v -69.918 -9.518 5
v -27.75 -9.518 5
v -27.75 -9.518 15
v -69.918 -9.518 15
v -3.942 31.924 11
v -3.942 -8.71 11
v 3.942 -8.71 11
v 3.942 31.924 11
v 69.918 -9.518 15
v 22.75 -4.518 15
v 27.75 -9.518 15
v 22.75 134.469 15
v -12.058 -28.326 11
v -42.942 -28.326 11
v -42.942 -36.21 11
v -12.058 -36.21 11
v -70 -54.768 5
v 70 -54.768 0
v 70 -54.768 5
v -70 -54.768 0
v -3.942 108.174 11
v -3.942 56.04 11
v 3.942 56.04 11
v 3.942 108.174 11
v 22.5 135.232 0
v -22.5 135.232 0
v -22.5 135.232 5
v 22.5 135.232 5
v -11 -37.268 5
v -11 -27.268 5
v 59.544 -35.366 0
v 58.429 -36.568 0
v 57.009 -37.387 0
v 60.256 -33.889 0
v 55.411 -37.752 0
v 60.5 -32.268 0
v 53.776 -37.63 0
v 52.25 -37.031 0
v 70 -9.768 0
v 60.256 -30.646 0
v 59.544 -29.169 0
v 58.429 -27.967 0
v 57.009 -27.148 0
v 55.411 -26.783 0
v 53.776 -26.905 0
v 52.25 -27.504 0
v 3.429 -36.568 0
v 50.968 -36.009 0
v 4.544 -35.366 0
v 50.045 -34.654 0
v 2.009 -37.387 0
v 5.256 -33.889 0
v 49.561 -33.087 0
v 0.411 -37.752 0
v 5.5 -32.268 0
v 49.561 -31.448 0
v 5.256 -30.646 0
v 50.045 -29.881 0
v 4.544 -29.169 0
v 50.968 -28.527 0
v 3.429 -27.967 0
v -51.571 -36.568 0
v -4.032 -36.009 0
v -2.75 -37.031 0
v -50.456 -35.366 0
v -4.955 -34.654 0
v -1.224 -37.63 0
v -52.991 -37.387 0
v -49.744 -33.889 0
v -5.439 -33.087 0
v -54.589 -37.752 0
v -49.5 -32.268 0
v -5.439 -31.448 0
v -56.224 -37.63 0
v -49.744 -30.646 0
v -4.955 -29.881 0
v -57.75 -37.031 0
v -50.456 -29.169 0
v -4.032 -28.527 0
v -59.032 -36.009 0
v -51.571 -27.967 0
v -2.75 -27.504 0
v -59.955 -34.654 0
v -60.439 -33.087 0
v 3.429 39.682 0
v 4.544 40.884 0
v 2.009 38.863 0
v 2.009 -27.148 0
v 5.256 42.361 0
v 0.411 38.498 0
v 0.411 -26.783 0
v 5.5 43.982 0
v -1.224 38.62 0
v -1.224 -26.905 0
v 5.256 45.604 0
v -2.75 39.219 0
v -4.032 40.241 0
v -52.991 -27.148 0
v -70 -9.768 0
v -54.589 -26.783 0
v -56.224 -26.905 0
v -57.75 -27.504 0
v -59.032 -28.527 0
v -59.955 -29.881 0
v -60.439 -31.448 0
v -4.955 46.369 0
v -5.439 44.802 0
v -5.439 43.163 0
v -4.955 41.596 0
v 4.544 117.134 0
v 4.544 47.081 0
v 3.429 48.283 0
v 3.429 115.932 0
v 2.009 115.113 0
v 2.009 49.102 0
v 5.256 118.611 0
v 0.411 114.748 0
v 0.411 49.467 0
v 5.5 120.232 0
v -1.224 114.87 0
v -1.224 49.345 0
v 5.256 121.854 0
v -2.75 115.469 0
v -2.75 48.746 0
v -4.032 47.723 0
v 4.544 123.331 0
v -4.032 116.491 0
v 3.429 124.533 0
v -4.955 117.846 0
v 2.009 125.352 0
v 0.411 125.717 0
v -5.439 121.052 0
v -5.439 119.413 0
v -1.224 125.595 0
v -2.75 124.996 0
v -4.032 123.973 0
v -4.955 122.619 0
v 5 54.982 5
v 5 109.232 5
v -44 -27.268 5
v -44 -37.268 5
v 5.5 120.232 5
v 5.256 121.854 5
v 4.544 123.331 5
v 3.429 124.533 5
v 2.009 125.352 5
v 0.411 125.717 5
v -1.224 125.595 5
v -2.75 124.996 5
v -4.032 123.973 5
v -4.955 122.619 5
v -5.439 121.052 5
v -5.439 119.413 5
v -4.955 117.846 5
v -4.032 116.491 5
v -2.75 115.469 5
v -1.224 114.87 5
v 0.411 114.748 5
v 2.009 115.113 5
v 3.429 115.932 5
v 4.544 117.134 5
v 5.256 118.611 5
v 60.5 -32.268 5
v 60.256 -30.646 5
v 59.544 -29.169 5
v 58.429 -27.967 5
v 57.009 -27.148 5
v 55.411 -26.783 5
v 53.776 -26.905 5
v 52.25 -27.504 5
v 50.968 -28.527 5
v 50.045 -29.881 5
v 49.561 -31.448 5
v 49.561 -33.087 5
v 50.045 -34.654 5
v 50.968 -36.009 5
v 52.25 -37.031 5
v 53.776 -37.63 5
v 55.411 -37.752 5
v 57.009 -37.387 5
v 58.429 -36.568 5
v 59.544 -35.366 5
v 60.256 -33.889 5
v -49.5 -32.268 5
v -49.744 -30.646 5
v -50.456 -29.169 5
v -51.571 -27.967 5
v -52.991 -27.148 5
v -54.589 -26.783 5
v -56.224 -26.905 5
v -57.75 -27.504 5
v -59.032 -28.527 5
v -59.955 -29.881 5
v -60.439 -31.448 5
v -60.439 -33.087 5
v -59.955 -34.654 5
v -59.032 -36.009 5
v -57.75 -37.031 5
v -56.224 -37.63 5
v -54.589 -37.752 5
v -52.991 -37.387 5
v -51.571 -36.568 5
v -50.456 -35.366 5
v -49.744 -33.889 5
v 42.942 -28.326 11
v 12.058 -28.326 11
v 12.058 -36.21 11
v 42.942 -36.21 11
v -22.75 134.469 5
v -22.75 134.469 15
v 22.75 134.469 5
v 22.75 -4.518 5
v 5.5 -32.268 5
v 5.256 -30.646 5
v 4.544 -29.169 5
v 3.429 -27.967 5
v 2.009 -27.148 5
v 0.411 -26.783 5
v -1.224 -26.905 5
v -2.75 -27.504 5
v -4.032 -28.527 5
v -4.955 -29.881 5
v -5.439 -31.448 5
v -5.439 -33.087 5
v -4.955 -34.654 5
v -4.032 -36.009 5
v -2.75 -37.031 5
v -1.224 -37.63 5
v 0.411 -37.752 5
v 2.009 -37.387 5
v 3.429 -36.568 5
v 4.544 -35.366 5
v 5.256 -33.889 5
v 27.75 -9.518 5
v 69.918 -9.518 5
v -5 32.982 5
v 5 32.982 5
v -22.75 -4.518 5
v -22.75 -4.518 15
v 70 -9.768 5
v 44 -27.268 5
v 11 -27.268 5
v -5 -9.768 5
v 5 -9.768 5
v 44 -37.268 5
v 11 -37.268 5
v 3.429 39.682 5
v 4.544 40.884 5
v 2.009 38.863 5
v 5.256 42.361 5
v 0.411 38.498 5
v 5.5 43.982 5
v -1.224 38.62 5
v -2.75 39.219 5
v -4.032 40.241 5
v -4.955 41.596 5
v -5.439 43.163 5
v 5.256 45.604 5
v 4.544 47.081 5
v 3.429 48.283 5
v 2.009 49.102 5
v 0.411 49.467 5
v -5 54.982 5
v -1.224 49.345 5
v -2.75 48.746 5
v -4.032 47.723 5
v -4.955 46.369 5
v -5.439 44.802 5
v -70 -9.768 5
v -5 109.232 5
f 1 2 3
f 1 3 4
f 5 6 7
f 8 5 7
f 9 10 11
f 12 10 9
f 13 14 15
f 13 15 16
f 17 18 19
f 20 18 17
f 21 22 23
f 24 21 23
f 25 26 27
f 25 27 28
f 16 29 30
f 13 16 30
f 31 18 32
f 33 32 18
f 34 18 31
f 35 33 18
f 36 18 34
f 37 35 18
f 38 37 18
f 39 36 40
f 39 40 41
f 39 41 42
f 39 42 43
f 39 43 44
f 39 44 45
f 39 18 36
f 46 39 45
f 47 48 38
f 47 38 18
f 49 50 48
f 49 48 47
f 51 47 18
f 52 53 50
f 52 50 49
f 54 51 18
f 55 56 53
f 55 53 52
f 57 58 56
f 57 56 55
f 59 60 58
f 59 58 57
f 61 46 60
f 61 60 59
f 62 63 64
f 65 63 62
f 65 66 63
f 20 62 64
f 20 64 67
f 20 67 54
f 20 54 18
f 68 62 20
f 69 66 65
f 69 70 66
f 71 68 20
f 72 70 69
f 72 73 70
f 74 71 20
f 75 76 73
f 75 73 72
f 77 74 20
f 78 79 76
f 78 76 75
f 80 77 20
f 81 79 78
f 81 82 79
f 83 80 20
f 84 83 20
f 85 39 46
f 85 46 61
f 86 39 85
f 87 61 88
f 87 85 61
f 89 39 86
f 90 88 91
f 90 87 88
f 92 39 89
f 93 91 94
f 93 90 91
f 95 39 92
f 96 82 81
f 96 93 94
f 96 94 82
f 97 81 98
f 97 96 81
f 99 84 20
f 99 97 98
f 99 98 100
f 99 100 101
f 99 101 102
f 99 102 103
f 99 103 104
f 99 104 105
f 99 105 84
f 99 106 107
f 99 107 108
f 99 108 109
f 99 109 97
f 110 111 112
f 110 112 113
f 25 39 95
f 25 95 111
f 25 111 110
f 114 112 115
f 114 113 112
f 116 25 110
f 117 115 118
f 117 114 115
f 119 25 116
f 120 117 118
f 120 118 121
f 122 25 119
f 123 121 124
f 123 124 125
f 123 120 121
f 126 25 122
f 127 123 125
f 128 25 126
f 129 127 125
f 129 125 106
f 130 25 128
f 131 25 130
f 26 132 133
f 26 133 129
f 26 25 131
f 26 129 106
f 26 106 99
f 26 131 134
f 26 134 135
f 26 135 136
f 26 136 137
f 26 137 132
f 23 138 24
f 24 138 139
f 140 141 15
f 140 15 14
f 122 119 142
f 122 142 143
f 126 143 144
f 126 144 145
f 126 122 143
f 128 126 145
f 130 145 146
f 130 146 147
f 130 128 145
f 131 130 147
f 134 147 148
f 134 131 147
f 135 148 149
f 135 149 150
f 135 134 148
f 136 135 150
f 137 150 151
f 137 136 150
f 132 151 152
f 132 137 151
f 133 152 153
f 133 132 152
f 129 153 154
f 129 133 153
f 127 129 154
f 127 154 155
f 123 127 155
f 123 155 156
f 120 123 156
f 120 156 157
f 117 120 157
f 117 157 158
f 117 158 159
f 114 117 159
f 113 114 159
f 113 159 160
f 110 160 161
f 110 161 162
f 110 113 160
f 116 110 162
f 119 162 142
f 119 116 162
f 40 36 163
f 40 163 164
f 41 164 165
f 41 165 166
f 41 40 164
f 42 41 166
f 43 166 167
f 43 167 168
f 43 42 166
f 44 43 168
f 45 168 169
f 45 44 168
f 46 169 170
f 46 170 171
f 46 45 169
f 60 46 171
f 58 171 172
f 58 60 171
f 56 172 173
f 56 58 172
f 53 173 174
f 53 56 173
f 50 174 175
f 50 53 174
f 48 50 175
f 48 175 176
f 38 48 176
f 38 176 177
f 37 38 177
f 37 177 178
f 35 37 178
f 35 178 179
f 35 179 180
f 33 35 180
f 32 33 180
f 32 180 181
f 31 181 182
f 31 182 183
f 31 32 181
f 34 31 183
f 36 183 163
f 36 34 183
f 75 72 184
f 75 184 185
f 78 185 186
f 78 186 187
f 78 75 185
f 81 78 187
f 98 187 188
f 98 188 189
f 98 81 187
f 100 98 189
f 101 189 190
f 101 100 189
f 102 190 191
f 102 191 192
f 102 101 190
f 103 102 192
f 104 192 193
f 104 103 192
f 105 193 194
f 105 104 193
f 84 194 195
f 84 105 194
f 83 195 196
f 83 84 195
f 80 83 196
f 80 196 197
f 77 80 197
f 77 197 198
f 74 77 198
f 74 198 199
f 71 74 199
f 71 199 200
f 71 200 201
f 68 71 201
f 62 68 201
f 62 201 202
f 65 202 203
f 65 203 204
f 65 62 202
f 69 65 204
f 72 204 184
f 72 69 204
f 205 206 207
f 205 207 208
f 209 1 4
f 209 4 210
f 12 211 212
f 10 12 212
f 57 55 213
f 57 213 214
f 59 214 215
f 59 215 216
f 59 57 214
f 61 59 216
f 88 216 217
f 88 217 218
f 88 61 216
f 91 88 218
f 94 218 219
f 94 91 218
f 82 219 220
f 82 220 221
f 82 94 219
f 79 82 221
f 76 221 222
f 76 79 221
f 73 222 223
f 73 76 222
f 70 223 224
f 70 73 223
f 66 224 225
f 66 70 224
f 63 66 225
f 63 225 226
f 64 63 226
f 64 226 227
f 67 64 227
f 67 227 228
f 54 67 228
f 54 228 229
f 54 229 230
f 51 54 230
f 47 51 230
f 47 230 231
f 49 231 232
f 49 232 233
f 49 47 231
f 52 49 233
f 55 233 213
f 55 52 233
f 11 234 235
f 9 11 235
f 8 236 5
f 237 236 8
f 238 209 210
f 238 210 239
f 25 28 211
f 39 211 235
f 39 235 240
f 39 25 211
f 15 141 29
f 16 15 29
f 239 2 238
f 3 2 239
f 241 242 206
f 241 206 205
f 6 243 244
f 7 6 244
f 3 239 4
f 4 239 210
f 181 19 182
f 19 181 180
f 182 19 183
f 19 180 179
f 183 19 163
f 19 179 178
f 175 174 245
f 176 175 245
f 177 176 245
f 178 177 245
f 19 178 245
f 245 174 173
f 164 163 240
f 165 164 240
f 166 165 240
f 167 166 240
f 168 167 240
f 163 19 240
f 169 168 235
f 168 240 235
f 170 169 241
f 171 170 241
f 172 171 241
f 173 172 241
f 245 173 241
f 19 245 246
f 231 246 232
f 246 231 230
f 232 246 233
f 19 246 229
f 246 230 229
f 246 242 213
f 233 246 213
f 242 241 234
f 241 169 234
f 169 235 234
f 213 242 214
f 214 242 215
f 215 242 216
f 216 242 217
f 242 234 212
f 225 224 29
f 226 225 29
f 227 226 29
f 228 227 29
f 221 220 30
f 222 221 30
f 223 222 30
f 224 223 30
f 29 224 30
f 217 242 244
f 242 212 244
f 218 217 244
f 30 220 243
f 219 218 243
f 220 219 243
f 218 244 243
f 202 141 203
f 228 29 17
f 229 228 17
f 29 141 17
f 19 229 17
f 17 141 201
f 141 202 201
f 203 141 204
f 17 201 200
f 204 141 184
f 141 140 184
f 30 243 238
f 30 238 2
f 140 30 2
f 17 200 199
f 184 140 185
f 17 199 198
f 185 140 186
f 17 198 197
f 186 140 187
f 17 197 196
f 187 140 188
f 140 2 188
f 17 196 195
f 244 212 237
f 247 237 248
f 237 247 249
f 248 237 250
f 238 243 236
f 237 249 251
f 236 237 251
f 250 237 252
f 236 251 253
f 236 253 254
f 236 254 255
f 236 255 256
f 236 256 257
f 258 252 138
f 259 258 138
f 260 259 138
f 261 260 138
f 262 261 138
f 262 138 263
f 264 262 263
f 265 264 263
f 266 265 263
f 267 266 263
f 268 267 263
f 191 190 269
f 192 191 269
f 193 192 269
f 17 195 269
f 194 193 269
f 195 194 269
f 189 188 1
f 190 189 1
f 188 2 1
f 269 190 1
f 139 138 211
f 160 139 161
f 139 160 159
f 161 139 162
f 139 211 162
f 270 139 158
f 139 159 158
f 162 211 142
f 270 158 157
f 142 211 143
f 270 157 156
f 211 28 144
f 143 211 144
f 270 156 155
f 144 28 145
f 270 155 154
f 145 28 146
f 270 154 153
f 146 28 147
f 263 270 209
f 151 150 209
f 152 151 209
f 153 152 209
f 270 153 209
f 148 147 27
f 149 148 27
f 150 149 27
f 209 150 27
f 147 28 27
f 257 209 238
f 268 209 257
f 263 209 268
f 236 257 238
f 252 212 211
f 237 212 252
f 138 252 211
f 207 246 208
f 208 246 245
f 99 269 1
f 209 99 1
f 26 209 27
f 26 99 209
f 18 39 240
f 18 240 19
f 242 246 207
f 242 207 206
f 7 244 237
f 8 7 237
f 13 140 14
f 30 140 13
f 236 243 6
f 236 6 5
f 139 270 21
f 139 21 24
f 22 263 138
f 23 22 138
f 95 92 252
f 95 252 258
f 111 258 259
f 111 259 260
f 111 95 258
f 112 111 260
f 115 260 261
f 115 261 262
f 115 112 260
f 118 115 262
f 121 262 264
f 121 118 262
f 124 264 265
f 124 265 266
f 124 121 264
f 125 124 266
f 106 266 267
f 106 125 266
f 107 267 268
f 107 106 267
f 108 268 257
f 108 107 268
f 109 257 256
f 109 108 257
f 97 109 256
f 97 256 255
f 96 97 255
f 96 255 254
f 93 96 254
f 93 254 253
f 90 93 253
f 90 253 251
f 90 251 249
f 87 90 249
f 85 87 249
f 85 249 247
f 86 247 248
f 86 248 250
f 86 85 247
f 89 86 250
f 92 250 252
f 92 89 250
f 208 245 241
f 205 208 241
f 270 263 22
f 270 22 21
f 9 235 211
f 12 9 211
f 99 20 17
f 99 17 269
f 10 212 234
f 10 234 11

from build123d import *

# Parameters (mm, degrees)
ESQUISSE1_R        = 5.5
BOSS_EXTRU_1_DEPTH = 5
ESQUISSE3_W        = 10
ESQUISSE3_H        = 54.25
ESQUISSE3_H_2      = 42.75
ESQUISSE3_W_2      = 33
ESQUISSE3_H_3      = 10
BOSS_EXTRU_3_DEPTH = 6
D_POUILLE2_ANGLE   = 10
BOSS_EXTRU_4_DEPTH = 10
CHANFREIN1_SIZE    = 5


with BuildPart() as part:
    # Esquisse1 → Boss.-Extru.1 (new body)
    with BuildSketch(Plane.XY):
        Polygon((-22.5, 135.232443508), (22.5, 135.232443508), (70, -9.767556492), (70, -54.767556492), (-70, -54.767556492), (-70, -9.767556492), align=None)
        with Locations((0, 120.232443508)):
            Circle(ESQUISSE1_R, mode=Mode.SUBTRACT)
        with Locations((0, 43.982443508)):
            Circle(ESQUISSE1_R, mode=Mode.SUBTRACT)
        with Locations((0, -32.267556492)):
            Circle(ESQUISSE1_R, mode=Mode.SUBTRACT)
        with Locations((-55, -32.267556492)):
            Circle(ESQUISSE1_R, mode=Mode.SUBTRACT)
        with Locations((55, -32.267556492)):
            Circle(ESQUISSE1_R, mode=Mode.SUBTRACT)
    extrude(amount=BOSS_EXTRU_1_DEPTH)

    # Esquisse3 → Boss.-Extru.3 (add)
    with BuildSketch(Plane.XY.offset(5)):
        with Locations((0, 82.107443508)):
            Rectangle(ESQUISSE3_W, ESQUISSE3_H)
        with Locations((0, 11.607443508)):
            Rectangle(ESQUISSE3_W, ESQUISSE3_H_2)
        with Locations((-27.5, -32.267556492)):
            Rectangle(ESQUISSE3_W_2, ESQUISSE3_H_3)
        with Locations((27.5, -32.267556492)):
            Rectangle(ESQUISSE3_W_2, ESQUISSE3_H_3)
    extrude(amount=BOSS_EXTRU_3_DEPTH)

    # Dépouille2
    d_pouille2_faces = [part.faces().sort_by_distance(p)[0] for p in [
        (0, 32.982443508, 8),
        (-27.5, -27.267556492, 8),
        (27.5, -27.267556492, 8),
        (0, 109.232443508, 8),
        (-11, -32.267556492, 8),
        (44, -32.267556492, 8),
        (5, 82.107443508, 8),
        (5, 11.607443508, 8),
        (-5, 82.107443508, 8),
        (0, 54.982443508, 8),
        (-5, 11.607443508, 8),
        (11, -32.267556492, 8),
        (27.5, -37.267556492, 8),
        (0, -9.767556492, 8),
        (-44, -32.267556492, 8),
        (-27.5, -37.267556492, 8),
    ]]
    draft(d_pouille2_faces, Plane.XY.offset(5), D_POUILLE2_ANGLE)

    # Esquisse4 → Boss.-Extru.4 (add)
    with BuildSketch(Plane.XY.offset(5)):
        Polygon((-22.75, 134.469285613), (-22.75, -9.517556492), (-69.918103448, -9.517556492), align=None)
        Polygon((22.75, -9.517556492), (69.918103448, -9.517556492), (22.75, 134.469285613), align=None)
    extrude(amount=BOSS_EXTRU_4_DEPTH)

    # Chanfrein1
    chanfrein1_edges = [part.edges().sort_by_distance(p)[0] for p in [
        (-22.75, -9.517556492, 10),
        (22.75, -9.517556492, 10),
    ]]
    chamfer(chanfrein1_edges, length=CHANFREIN1_SIZE)


solid = part.part
